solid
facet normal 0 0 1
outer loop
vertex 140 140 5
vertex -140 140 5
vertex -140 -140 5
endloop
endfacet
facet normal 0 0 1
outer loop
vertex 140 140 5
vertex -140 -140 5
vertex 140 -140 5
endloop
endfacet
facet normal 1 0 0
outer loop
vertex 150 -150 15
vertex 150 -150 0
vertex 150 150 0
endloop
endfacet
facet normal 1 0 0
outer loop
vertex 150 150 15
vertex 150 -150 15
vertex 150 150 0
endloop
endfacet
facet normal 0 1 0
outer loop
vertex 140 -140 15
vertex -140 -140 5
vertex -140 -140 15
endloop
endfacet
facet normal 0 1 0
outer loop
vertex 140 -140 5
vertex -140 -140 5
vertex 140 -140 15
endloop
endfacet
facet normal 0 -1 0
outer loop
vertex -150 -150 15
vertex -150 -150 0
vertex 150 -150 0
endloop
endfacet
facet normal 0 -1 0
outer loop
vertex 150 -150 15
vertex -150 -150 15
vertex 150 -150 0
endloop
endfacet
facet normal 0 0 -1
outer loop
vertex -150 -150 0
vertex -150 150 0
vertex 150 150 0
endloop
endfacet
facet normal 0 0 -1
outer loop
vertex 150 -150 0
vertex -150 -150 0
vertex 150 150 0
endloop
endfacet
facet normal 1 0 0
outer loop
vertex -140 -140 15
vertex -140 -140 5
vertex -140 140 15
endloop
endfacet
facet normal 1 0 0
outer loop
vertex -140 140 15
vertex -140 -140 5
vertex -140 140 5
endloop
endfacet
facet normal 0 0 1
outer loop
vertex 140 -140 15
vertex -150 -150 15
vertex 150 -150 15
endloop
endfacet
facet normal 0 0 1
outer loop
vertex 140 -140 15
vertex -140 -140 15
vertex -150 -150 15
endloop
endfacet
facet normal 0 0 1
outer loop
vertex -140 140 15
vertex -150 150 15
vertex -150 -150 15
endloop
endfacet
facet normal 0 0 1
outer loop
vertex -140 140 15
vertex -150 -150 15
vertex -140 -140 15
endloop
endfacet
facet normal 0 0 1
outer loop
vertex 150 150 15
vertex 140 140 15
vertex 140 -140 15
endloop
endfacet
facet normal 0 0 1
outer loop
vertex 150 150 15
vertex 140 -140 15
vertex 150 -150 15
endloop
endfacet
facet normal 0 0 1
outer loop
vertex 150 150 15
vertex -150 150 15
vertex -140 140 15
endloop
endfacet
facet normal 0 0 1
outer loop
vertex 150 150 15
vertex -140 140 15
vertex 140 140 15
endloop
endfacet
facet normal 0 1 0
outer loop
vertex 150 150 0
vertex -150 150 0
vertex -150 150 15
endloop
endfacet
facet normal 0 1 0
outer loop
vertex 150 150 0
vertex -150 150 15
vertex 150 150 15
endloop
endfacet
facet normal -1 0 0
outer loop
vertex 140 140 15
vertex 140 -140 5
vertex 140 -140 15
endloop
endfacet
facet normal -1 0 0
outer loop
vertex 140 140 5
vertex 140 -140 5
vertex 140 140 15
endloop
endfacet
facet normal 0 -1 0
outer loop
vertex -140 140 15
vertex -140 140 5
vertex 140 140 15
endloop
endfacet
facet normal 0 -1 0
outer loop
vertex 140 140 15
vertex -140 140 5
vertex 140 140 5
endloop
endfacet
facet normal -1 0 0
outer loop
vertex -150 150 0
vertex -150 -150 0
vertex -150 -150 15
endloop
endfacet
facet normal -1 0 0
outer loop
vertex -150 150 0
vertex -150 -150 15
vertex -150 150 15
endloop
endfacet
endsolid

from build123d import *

# Parameters (mm, degrees)
BOX001_W     = 280
BOX001_H     = 280
BOX001_DEPTH = 5
SKETCH_W     = 300
SKETCH_H     = 300
SKETCH_W_2   = 280
SKETCH_H_2   = 280
PAD_DEPTH    = 15


with BuildPart() as cube001:
    # Box001 → Box001 (new body)
    with BuildSketch(Plane(origin=(-140, -140, 0), x_dir=(1, 0, 0), z_dir=(0, 0, 1))):
        with Locations((140, 140)):
            Rectangle(BOX001_W, BOX001_H)
    extrude(amount=BOX001_DEPTH)


with BuildPart() as board_frame:
    # Sketch → Pad (new body)
    with BuildSketch(Plane.XY):
        Rectangle(SKETCH_W, SKETCH_H)
        Rectangle(SKETCH_W_2, SKETCH_H_2, mode=Mode.SUBTRACT)
    extrude(amount=PAD_DEPTH)

    # Fusion: union Cube001
    add(cube001.part)


solid = board_frame.part
